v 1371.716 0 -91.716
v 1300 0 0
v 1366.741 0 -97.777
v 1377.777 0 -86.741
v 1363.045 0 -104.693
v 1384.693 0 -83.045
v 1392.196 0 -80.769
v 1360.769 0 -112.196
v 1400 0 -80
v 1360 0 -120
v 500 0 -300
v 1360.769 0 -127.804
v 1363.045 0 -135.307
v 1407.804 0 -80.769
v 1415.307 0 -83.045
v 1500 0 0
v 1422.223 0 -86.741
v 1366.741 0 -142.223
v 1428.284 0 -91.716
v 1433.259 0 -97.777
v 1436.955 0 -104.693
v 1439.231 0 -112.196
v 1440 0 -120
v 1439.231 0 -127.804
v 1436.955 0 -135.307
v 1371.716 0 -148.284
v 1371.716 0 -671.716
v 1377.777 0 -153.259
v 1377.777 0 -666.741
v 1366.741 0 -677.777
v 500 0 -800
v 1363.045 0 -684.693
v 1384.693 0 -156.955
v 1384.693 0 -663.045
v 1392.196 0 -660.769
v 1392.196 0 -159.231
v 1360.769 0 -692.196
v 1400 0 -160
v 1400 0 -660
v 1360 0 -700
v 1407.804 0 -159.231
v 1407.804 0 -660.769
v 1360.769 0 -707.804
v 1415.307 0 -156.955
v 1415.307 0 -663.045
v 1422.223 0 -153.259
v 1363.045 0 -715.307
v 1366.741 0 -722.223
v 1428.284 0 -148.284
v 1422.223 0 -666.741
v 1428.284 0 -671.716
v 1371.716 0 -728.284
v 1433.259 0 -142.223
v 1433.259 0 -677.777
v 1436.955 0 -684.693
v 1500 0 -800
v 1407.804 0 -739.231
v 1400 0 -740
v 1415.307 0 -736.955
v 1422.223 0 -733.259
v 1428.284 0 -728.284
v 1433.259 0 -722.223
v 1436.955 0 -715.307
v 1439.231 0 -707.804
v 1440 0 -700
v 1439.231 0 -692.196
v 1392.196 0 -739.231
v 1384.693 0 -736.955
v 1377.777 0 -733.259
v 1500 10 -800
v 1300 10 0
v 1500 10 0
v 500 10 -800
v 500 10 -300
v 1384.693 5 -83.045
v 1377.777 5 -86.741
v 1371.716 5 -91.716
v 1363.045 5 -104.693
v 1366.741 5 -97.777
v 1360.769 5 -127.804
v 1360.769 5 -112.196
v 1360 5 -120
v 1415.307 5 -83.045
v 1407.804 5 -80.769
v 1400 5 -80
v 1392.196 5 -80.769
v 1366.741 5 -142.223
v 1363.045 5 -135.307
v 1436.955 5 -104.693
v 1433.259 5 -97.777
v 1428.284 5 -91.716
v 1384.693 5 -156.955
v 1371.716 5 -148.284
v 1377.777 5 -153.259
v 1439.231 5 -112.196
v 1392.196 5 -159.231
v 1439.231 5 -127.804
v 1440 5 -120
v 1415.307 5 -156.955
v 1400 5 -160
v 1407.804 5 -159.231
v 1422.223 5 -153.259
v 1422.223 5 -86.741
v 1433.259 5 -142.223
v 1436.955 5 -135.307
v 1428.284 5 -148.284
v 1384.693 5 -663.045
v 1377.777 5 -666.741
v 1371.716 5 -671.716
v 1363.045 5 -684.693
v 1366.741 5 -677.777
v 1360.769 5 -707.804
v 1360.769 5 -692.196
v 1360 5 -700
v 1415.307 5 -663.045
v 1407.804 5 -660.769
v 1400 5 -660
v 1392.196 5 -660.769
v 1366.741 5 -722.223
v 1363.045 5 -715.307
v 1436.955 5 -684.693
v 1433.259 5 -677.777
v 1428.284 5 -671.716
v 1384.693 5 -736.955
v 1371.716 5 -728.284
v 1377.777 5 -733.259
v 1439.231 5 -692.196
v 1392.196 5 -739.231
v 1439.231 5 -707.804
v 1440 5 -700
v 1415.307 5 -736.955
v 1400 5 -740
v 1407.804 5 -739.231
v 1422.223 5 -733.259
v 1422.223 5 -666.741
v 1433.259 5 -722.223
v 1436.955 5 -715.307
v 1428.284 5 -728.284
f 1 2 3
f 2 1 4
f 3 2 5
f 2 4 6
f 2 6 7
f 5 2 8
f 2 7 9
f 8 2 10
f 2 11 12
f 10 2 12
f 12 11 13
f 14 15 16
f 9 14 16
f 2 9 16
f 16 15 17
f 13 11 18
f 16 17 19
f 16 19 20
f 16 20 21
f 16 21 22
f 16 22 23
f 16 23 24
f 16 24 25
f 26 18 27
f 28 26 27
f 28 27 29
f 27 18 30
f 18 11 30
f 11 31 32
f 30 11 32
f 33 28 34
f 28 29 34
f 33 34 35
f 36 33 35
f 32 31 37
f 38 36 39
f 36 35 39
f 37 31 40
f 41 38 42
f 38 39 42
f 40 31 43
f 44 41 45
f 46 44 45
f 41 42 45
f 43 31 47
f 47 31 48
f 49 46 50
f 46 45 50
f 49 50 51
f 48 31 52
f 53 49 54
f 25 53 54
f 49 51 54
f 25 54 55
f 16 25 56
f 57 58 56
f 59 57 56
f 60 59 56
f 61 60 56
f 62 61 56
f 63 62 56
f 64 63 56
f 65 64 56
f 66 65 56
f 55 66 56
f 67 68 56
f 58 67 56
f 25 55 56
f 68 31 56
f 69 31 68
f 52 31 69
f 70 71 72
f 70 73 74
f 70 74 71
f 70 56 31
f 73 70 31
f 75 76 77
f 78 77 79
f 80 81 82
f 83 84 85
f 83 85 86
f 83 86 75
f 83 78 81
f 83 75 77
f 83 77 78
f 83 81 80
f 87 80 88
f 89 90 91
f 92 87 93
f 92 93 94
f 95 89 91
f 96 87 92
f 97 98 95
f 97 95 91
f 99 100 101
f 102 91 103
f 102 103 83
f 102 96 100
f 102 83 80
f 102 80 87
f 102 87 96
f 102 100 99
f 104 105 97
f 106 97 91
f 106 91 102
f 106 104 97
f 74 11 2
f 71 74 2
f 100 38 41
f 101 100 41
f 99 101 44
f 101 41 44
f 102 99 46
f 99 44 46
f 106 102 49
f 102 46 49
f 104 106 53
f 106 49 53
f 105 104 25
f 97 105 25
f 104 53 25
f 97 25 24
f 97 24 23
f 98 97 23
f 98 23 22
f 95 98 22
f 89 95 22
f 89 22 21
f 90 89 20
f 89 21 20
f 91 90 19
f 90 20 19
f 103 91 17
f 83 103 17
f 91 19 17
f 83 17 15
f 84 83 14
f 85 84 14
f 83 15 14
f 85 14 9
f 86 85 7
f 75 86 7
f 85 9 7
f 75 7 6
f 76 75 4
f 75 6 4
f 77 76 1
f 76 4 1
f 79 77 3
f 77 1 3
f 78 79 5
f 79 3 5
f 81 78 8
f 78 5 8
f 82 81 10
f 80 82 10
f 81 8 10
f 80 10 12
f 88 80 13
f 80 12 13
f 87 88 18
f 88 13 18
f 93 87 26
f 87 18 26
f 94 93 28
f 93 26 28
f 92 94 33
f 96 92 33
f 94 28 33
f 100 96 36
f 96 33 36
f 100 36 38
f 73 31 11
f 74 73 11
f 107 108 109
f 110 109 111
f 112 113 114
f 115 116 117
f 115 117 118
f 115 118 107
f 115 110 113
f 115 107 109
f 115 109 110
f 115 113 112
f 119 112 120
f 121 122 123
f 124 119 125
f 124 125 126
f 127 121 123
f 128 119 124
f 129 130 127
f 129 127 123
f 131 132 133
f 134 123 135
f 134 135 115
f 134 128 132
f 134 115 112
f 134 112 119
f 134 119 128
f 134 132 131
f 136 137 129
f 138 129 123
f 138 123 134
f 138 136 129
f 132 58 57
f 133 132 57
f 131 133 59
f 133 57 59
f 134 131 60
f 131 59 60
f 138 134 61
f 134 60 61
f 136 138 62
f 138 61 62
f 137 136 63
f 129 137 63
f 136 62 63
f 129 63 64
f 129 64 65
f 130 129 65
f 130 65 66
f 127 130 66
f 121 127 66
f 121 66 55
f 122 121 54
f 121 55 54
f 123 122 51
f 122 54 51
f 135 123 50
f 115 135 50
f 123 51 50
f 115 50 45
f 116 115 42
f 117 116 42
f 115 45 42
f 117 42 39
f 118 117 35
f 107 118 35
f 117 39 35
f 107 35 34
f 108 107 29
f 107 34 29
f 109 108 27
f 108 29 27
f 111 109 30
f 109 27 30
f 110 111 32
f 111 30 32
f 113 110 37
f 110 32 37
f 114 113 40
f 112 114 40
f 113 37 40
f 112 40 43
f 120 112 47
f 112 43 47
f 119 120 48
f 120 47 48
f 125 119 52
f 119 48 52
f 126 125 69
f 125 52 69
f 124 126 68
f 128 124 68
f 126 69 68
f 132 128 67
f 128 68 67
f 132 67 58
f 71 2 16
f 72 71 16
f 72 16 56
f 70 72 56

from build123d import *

# Parameters (mm, degrees)
EXTRUDE_1_DEPTH     = 10
SKETCH_2_R          = 40
CUT_EXTRUDE_1_DEPTH = 5


with BuildPart() as part:
    # Эскиз1 → Бобышка-Вытянуть1 (new body)
    with BuildSketch(Plane(origin=(0, 0, 0), x_dir=(1, 0, 0), z_dir=(0, 1, 0))):
        Polygon((1300, 0), (1500, 0), (1500, 800), (500, 800), (500, 300), align=None)
    extrude(amount=EXTRUDE_1_DEPTH)

    # Эскиз2 → Вырез-Вытянуть1 (cut)
    with BuildSketch(Plane.XZ):
        with Locations(Location((1400, -120, 0), (0, 0, 270))):
            Circle(SKETCH_2_R)
        with Locations(Location((1400, -700, 0), (0, 0, 270))):
            Circle(SKETCH_2_R)
    extrude(amount=-CUT_EXTRUDE_1_DEPTH, mode=Mode.SUBTRACT)


solid = part.part
